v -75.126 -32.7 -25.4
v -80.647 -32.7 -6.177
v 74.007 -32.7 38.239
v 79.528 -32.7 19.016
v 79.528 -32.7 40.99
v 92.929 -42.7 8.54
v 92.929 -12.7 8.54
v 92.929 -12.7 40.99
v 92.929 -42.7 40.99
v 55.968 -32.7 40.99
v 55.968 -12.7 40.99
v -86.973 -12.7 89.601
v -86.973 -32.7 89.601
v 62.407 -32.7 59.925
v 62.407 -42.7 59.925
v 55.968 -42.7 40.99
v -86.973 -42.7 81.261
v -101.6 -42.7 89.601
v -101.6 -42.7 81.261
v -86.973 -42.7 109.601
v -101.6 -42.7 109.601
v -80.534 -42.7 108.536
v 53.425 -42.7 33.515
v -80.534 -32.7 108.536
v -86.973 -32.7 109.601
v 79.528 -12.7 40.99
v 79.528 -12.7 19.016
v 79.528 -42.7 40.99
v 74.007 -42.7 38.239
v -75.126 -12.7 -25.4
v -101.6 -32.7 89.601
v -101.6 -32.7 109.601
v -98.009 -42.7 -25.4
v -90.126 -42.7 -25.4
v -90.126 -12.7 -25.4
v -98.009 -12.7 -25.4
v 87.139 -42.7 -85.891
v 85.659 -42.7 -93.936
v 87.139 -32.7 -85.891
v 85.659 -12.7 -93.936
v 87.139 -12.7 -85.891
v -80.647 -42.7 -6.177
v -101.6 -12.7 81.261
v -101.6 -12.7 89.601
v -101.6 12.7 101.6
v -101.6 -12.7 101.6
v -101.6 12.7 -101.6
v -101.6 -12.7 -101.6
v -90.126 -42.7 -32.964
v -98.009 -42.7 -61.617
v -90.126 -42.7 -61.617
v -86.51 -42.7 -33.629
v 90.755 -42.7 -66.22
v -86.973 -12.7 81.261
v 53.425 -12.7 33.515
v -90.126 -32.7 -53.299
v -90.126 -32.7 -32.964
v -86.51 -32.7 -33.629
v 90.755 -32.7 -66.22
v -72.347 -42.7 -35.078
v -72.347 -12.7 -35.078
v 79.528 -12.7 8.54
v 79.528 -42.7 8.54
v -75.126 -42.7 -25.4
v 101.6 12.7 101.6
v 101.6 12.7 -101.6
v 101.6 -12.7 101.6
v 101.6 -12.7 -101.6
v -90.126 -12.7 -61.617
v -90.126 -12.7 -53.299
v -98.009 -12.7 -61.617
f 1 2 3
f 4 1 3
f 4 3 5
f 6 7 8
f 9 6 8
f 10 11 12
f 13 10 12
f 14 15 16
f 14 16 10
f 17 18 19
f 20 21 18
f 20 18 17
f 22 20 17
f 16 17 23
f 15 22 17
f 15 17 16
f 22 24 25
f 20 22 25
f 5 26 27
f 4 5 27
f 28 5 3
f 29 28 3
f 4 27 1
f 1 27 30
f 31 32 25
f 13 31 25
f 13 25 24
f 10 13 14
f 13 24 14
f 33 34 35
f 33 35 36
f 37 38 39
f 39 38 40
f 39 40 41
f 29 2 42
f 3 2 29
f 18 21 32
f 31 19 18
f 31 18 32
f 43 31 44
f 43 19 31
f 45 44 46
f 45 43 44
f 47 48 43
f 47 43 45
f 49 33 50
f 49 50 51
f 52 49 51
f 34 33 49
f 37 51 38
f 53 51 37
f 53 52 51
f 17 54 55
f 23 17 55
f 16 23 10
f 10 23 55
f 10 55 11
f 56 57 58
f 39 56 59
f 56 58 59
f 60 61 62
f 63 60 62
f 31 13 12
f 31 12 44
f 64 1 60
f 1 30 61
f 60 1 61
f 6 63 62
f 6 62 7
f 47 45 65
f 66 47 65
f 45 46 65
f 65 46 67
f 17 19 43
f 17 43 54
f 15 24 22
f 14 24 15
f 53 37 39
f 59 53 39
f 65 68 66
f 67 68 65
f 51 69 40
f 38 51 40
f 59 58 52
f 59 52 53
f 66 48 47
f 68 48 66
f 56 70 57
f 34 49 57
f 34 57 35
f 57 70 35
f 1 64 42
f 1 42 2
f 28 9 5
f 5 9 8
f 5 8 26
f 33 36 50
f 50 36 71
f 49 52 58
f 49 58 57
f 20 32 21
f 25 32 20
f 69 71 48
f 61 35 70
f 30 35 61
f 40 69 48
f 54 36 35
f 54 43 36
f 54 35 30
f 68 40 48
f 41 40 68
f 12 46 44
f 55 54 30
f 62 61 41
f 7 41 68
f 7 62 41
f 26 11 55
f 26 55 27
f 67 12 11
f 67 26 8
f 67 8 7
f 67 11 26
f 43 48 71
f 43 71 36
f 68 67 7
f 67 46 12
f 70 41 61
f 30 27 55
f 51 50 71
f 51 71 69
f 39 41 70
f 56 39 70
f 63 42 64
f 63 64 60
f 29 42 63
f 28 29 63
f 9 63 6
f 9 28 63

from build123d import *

# Parameters (mm, degrees)
F0_W      = 203.2
F0_H      = 203.2
F1_DEPTH  = 12.7
F3_DEPTH  = 30
F4_W      = 14.6268990993
F4_H      = 10
F5_DEPTH  = 20
F6_W      = 150.9801479243
F6_H      = 10
F7_DEPTH  = 20
F9_DEPTH  = 10
F10_W     = 160.9058431263
F10_H     = 10
F11_DEPTH = 20
F12_W     = 180.2359047158
F12_H     = 10
F13_DEPTH = 20
F15_DEPTH = 10
F17_DEPTH = 10


with BuildPart() as f1:
    # F0 (on Front) → F1 (new body, symmetric)
    with BuildSketch(Plane.XZ):
        Rectangle(F0_W, F0_H)
    extrude(amount=F1_DEPTH, both=True)

    # F2 (on face) → F3 (join)
    with BuildSketch(Plane.XZ.offset(12.7)):
        Polygon((-86.9731009007, 89.6006897092), (-101.6, 89.6006897092), (-101.6, 81.2605177762), (-86.9731009007, 81.2605177762), (53.4253248086, 33.5147284107), (55.9675842524, 40.99034518), align=None)
        Polygon((92.9285819118, 40.99034518), (79.5278856938, 40.99034518), (79.5278856938, 19.016228551), (79.5278856938, 8.5395236786), (92.9285819118, 8.5395236786), align=None)
        Polygon((79.5278856938, 8.5395236786), (79.5278856938, 19.016228551), (-75.126208961, -25.4), (-72.3465969379, -35.0784079816), align=None)
        Polygon((-90.126208961, -25.4), (-98.0089604855, -25.4), (-98.0089604855, -61.6170221653), (-90.126208961, -61.6170221653), (-90.126208961, -53.2994725252), align=None)
        Polygon((-90.126208961, -53.2994725252), (-90.126208961, -61.6170221653), (85.6593027711, -93.9363369431), (87.1385357673, -85.8907539536), align=None)
    extrude(amount=F3_DEPTH)

    # F4 (on face) → F5 (join)
    with BuildSketch(Plane.XY.offset(89.6006897092)):
        with Locations((-94.2865504503, -37.7)):
            Rectangle(F4_W, F4_H)
    extrude(amount=F5_DEPTH)

    # F6 (on face) → F7 (join)
    with BuildSketch(Plane(origin=(18.2964041178, 0, 53.8013166903), x_dir=(0.9467515241, 0, -0.3219651404), z_dir=(0.3219651404, 0, 0.9467515241))):
        with Locations((-35.7001405146, -37.7)):
            Rectangle(F6_W, F6_H)
    extrude(amount=F7_DEPTH)

    # F8 (on face) → F9 (join)
    with BuildSketch(Plane.XZ.offset(42.7)):
        Polygon((-86.9731009007, 109.6006897092), (-86.9731009007, 89.6006897092), (-80.533798092, 108.5357201908), align=None)
    extrude(amount=-F9_DEPTH)

    # F10 (on face) → F11 (join)
    with BuildSketch(Plane(origin=(1.0145486096, 0, -3.532584864), x_dir=(0.9611465417, 0, 0.2760386303), z_dir=(-0.2760386303, 0, 0.9611465417))):
        with Locations((1.234244421, -37.7)):
            Rectangle(F10_W, F10_H)
    extrude(amount=F11_DEPTH)

    # F12 (on face) → F13 (join)
    with BuildSketch(Plane(origin=(-12.4259747266, 0, -67.5851682222), x_dir=(0.9835151604, 0, -0.1808256878), z_dir=(0.1808256878, 0, 0.9835151604))):
        with Locations((11.1153732758, -37.7)):
            Rectangle(F12_W, F12_H)
    extrude(amount=F13_DEPTH)

    # F14 (on face) → F15 (join)
    with BuildSketch(Plane.XZ.offset(42.7)):
        Polygon((74.0071130869, 38.2391593843), (79.5278856938, 19.016228551), (79.5278856938, 40.99034518), align=None)
    extrude(amount=-F15_DEPTH)

    # F16 (on face) → F17 (join)
    with BuildSketch(Plane.XZ.offset(42.7)):
        Polygon((-90.126208961, -32.9642496368), (-90.126208961, -53.2994725252), (-86.5096952059, -33.6291693182), align=None)
    extrude(amount=-F17_DEPTH)


solid = f1.part
